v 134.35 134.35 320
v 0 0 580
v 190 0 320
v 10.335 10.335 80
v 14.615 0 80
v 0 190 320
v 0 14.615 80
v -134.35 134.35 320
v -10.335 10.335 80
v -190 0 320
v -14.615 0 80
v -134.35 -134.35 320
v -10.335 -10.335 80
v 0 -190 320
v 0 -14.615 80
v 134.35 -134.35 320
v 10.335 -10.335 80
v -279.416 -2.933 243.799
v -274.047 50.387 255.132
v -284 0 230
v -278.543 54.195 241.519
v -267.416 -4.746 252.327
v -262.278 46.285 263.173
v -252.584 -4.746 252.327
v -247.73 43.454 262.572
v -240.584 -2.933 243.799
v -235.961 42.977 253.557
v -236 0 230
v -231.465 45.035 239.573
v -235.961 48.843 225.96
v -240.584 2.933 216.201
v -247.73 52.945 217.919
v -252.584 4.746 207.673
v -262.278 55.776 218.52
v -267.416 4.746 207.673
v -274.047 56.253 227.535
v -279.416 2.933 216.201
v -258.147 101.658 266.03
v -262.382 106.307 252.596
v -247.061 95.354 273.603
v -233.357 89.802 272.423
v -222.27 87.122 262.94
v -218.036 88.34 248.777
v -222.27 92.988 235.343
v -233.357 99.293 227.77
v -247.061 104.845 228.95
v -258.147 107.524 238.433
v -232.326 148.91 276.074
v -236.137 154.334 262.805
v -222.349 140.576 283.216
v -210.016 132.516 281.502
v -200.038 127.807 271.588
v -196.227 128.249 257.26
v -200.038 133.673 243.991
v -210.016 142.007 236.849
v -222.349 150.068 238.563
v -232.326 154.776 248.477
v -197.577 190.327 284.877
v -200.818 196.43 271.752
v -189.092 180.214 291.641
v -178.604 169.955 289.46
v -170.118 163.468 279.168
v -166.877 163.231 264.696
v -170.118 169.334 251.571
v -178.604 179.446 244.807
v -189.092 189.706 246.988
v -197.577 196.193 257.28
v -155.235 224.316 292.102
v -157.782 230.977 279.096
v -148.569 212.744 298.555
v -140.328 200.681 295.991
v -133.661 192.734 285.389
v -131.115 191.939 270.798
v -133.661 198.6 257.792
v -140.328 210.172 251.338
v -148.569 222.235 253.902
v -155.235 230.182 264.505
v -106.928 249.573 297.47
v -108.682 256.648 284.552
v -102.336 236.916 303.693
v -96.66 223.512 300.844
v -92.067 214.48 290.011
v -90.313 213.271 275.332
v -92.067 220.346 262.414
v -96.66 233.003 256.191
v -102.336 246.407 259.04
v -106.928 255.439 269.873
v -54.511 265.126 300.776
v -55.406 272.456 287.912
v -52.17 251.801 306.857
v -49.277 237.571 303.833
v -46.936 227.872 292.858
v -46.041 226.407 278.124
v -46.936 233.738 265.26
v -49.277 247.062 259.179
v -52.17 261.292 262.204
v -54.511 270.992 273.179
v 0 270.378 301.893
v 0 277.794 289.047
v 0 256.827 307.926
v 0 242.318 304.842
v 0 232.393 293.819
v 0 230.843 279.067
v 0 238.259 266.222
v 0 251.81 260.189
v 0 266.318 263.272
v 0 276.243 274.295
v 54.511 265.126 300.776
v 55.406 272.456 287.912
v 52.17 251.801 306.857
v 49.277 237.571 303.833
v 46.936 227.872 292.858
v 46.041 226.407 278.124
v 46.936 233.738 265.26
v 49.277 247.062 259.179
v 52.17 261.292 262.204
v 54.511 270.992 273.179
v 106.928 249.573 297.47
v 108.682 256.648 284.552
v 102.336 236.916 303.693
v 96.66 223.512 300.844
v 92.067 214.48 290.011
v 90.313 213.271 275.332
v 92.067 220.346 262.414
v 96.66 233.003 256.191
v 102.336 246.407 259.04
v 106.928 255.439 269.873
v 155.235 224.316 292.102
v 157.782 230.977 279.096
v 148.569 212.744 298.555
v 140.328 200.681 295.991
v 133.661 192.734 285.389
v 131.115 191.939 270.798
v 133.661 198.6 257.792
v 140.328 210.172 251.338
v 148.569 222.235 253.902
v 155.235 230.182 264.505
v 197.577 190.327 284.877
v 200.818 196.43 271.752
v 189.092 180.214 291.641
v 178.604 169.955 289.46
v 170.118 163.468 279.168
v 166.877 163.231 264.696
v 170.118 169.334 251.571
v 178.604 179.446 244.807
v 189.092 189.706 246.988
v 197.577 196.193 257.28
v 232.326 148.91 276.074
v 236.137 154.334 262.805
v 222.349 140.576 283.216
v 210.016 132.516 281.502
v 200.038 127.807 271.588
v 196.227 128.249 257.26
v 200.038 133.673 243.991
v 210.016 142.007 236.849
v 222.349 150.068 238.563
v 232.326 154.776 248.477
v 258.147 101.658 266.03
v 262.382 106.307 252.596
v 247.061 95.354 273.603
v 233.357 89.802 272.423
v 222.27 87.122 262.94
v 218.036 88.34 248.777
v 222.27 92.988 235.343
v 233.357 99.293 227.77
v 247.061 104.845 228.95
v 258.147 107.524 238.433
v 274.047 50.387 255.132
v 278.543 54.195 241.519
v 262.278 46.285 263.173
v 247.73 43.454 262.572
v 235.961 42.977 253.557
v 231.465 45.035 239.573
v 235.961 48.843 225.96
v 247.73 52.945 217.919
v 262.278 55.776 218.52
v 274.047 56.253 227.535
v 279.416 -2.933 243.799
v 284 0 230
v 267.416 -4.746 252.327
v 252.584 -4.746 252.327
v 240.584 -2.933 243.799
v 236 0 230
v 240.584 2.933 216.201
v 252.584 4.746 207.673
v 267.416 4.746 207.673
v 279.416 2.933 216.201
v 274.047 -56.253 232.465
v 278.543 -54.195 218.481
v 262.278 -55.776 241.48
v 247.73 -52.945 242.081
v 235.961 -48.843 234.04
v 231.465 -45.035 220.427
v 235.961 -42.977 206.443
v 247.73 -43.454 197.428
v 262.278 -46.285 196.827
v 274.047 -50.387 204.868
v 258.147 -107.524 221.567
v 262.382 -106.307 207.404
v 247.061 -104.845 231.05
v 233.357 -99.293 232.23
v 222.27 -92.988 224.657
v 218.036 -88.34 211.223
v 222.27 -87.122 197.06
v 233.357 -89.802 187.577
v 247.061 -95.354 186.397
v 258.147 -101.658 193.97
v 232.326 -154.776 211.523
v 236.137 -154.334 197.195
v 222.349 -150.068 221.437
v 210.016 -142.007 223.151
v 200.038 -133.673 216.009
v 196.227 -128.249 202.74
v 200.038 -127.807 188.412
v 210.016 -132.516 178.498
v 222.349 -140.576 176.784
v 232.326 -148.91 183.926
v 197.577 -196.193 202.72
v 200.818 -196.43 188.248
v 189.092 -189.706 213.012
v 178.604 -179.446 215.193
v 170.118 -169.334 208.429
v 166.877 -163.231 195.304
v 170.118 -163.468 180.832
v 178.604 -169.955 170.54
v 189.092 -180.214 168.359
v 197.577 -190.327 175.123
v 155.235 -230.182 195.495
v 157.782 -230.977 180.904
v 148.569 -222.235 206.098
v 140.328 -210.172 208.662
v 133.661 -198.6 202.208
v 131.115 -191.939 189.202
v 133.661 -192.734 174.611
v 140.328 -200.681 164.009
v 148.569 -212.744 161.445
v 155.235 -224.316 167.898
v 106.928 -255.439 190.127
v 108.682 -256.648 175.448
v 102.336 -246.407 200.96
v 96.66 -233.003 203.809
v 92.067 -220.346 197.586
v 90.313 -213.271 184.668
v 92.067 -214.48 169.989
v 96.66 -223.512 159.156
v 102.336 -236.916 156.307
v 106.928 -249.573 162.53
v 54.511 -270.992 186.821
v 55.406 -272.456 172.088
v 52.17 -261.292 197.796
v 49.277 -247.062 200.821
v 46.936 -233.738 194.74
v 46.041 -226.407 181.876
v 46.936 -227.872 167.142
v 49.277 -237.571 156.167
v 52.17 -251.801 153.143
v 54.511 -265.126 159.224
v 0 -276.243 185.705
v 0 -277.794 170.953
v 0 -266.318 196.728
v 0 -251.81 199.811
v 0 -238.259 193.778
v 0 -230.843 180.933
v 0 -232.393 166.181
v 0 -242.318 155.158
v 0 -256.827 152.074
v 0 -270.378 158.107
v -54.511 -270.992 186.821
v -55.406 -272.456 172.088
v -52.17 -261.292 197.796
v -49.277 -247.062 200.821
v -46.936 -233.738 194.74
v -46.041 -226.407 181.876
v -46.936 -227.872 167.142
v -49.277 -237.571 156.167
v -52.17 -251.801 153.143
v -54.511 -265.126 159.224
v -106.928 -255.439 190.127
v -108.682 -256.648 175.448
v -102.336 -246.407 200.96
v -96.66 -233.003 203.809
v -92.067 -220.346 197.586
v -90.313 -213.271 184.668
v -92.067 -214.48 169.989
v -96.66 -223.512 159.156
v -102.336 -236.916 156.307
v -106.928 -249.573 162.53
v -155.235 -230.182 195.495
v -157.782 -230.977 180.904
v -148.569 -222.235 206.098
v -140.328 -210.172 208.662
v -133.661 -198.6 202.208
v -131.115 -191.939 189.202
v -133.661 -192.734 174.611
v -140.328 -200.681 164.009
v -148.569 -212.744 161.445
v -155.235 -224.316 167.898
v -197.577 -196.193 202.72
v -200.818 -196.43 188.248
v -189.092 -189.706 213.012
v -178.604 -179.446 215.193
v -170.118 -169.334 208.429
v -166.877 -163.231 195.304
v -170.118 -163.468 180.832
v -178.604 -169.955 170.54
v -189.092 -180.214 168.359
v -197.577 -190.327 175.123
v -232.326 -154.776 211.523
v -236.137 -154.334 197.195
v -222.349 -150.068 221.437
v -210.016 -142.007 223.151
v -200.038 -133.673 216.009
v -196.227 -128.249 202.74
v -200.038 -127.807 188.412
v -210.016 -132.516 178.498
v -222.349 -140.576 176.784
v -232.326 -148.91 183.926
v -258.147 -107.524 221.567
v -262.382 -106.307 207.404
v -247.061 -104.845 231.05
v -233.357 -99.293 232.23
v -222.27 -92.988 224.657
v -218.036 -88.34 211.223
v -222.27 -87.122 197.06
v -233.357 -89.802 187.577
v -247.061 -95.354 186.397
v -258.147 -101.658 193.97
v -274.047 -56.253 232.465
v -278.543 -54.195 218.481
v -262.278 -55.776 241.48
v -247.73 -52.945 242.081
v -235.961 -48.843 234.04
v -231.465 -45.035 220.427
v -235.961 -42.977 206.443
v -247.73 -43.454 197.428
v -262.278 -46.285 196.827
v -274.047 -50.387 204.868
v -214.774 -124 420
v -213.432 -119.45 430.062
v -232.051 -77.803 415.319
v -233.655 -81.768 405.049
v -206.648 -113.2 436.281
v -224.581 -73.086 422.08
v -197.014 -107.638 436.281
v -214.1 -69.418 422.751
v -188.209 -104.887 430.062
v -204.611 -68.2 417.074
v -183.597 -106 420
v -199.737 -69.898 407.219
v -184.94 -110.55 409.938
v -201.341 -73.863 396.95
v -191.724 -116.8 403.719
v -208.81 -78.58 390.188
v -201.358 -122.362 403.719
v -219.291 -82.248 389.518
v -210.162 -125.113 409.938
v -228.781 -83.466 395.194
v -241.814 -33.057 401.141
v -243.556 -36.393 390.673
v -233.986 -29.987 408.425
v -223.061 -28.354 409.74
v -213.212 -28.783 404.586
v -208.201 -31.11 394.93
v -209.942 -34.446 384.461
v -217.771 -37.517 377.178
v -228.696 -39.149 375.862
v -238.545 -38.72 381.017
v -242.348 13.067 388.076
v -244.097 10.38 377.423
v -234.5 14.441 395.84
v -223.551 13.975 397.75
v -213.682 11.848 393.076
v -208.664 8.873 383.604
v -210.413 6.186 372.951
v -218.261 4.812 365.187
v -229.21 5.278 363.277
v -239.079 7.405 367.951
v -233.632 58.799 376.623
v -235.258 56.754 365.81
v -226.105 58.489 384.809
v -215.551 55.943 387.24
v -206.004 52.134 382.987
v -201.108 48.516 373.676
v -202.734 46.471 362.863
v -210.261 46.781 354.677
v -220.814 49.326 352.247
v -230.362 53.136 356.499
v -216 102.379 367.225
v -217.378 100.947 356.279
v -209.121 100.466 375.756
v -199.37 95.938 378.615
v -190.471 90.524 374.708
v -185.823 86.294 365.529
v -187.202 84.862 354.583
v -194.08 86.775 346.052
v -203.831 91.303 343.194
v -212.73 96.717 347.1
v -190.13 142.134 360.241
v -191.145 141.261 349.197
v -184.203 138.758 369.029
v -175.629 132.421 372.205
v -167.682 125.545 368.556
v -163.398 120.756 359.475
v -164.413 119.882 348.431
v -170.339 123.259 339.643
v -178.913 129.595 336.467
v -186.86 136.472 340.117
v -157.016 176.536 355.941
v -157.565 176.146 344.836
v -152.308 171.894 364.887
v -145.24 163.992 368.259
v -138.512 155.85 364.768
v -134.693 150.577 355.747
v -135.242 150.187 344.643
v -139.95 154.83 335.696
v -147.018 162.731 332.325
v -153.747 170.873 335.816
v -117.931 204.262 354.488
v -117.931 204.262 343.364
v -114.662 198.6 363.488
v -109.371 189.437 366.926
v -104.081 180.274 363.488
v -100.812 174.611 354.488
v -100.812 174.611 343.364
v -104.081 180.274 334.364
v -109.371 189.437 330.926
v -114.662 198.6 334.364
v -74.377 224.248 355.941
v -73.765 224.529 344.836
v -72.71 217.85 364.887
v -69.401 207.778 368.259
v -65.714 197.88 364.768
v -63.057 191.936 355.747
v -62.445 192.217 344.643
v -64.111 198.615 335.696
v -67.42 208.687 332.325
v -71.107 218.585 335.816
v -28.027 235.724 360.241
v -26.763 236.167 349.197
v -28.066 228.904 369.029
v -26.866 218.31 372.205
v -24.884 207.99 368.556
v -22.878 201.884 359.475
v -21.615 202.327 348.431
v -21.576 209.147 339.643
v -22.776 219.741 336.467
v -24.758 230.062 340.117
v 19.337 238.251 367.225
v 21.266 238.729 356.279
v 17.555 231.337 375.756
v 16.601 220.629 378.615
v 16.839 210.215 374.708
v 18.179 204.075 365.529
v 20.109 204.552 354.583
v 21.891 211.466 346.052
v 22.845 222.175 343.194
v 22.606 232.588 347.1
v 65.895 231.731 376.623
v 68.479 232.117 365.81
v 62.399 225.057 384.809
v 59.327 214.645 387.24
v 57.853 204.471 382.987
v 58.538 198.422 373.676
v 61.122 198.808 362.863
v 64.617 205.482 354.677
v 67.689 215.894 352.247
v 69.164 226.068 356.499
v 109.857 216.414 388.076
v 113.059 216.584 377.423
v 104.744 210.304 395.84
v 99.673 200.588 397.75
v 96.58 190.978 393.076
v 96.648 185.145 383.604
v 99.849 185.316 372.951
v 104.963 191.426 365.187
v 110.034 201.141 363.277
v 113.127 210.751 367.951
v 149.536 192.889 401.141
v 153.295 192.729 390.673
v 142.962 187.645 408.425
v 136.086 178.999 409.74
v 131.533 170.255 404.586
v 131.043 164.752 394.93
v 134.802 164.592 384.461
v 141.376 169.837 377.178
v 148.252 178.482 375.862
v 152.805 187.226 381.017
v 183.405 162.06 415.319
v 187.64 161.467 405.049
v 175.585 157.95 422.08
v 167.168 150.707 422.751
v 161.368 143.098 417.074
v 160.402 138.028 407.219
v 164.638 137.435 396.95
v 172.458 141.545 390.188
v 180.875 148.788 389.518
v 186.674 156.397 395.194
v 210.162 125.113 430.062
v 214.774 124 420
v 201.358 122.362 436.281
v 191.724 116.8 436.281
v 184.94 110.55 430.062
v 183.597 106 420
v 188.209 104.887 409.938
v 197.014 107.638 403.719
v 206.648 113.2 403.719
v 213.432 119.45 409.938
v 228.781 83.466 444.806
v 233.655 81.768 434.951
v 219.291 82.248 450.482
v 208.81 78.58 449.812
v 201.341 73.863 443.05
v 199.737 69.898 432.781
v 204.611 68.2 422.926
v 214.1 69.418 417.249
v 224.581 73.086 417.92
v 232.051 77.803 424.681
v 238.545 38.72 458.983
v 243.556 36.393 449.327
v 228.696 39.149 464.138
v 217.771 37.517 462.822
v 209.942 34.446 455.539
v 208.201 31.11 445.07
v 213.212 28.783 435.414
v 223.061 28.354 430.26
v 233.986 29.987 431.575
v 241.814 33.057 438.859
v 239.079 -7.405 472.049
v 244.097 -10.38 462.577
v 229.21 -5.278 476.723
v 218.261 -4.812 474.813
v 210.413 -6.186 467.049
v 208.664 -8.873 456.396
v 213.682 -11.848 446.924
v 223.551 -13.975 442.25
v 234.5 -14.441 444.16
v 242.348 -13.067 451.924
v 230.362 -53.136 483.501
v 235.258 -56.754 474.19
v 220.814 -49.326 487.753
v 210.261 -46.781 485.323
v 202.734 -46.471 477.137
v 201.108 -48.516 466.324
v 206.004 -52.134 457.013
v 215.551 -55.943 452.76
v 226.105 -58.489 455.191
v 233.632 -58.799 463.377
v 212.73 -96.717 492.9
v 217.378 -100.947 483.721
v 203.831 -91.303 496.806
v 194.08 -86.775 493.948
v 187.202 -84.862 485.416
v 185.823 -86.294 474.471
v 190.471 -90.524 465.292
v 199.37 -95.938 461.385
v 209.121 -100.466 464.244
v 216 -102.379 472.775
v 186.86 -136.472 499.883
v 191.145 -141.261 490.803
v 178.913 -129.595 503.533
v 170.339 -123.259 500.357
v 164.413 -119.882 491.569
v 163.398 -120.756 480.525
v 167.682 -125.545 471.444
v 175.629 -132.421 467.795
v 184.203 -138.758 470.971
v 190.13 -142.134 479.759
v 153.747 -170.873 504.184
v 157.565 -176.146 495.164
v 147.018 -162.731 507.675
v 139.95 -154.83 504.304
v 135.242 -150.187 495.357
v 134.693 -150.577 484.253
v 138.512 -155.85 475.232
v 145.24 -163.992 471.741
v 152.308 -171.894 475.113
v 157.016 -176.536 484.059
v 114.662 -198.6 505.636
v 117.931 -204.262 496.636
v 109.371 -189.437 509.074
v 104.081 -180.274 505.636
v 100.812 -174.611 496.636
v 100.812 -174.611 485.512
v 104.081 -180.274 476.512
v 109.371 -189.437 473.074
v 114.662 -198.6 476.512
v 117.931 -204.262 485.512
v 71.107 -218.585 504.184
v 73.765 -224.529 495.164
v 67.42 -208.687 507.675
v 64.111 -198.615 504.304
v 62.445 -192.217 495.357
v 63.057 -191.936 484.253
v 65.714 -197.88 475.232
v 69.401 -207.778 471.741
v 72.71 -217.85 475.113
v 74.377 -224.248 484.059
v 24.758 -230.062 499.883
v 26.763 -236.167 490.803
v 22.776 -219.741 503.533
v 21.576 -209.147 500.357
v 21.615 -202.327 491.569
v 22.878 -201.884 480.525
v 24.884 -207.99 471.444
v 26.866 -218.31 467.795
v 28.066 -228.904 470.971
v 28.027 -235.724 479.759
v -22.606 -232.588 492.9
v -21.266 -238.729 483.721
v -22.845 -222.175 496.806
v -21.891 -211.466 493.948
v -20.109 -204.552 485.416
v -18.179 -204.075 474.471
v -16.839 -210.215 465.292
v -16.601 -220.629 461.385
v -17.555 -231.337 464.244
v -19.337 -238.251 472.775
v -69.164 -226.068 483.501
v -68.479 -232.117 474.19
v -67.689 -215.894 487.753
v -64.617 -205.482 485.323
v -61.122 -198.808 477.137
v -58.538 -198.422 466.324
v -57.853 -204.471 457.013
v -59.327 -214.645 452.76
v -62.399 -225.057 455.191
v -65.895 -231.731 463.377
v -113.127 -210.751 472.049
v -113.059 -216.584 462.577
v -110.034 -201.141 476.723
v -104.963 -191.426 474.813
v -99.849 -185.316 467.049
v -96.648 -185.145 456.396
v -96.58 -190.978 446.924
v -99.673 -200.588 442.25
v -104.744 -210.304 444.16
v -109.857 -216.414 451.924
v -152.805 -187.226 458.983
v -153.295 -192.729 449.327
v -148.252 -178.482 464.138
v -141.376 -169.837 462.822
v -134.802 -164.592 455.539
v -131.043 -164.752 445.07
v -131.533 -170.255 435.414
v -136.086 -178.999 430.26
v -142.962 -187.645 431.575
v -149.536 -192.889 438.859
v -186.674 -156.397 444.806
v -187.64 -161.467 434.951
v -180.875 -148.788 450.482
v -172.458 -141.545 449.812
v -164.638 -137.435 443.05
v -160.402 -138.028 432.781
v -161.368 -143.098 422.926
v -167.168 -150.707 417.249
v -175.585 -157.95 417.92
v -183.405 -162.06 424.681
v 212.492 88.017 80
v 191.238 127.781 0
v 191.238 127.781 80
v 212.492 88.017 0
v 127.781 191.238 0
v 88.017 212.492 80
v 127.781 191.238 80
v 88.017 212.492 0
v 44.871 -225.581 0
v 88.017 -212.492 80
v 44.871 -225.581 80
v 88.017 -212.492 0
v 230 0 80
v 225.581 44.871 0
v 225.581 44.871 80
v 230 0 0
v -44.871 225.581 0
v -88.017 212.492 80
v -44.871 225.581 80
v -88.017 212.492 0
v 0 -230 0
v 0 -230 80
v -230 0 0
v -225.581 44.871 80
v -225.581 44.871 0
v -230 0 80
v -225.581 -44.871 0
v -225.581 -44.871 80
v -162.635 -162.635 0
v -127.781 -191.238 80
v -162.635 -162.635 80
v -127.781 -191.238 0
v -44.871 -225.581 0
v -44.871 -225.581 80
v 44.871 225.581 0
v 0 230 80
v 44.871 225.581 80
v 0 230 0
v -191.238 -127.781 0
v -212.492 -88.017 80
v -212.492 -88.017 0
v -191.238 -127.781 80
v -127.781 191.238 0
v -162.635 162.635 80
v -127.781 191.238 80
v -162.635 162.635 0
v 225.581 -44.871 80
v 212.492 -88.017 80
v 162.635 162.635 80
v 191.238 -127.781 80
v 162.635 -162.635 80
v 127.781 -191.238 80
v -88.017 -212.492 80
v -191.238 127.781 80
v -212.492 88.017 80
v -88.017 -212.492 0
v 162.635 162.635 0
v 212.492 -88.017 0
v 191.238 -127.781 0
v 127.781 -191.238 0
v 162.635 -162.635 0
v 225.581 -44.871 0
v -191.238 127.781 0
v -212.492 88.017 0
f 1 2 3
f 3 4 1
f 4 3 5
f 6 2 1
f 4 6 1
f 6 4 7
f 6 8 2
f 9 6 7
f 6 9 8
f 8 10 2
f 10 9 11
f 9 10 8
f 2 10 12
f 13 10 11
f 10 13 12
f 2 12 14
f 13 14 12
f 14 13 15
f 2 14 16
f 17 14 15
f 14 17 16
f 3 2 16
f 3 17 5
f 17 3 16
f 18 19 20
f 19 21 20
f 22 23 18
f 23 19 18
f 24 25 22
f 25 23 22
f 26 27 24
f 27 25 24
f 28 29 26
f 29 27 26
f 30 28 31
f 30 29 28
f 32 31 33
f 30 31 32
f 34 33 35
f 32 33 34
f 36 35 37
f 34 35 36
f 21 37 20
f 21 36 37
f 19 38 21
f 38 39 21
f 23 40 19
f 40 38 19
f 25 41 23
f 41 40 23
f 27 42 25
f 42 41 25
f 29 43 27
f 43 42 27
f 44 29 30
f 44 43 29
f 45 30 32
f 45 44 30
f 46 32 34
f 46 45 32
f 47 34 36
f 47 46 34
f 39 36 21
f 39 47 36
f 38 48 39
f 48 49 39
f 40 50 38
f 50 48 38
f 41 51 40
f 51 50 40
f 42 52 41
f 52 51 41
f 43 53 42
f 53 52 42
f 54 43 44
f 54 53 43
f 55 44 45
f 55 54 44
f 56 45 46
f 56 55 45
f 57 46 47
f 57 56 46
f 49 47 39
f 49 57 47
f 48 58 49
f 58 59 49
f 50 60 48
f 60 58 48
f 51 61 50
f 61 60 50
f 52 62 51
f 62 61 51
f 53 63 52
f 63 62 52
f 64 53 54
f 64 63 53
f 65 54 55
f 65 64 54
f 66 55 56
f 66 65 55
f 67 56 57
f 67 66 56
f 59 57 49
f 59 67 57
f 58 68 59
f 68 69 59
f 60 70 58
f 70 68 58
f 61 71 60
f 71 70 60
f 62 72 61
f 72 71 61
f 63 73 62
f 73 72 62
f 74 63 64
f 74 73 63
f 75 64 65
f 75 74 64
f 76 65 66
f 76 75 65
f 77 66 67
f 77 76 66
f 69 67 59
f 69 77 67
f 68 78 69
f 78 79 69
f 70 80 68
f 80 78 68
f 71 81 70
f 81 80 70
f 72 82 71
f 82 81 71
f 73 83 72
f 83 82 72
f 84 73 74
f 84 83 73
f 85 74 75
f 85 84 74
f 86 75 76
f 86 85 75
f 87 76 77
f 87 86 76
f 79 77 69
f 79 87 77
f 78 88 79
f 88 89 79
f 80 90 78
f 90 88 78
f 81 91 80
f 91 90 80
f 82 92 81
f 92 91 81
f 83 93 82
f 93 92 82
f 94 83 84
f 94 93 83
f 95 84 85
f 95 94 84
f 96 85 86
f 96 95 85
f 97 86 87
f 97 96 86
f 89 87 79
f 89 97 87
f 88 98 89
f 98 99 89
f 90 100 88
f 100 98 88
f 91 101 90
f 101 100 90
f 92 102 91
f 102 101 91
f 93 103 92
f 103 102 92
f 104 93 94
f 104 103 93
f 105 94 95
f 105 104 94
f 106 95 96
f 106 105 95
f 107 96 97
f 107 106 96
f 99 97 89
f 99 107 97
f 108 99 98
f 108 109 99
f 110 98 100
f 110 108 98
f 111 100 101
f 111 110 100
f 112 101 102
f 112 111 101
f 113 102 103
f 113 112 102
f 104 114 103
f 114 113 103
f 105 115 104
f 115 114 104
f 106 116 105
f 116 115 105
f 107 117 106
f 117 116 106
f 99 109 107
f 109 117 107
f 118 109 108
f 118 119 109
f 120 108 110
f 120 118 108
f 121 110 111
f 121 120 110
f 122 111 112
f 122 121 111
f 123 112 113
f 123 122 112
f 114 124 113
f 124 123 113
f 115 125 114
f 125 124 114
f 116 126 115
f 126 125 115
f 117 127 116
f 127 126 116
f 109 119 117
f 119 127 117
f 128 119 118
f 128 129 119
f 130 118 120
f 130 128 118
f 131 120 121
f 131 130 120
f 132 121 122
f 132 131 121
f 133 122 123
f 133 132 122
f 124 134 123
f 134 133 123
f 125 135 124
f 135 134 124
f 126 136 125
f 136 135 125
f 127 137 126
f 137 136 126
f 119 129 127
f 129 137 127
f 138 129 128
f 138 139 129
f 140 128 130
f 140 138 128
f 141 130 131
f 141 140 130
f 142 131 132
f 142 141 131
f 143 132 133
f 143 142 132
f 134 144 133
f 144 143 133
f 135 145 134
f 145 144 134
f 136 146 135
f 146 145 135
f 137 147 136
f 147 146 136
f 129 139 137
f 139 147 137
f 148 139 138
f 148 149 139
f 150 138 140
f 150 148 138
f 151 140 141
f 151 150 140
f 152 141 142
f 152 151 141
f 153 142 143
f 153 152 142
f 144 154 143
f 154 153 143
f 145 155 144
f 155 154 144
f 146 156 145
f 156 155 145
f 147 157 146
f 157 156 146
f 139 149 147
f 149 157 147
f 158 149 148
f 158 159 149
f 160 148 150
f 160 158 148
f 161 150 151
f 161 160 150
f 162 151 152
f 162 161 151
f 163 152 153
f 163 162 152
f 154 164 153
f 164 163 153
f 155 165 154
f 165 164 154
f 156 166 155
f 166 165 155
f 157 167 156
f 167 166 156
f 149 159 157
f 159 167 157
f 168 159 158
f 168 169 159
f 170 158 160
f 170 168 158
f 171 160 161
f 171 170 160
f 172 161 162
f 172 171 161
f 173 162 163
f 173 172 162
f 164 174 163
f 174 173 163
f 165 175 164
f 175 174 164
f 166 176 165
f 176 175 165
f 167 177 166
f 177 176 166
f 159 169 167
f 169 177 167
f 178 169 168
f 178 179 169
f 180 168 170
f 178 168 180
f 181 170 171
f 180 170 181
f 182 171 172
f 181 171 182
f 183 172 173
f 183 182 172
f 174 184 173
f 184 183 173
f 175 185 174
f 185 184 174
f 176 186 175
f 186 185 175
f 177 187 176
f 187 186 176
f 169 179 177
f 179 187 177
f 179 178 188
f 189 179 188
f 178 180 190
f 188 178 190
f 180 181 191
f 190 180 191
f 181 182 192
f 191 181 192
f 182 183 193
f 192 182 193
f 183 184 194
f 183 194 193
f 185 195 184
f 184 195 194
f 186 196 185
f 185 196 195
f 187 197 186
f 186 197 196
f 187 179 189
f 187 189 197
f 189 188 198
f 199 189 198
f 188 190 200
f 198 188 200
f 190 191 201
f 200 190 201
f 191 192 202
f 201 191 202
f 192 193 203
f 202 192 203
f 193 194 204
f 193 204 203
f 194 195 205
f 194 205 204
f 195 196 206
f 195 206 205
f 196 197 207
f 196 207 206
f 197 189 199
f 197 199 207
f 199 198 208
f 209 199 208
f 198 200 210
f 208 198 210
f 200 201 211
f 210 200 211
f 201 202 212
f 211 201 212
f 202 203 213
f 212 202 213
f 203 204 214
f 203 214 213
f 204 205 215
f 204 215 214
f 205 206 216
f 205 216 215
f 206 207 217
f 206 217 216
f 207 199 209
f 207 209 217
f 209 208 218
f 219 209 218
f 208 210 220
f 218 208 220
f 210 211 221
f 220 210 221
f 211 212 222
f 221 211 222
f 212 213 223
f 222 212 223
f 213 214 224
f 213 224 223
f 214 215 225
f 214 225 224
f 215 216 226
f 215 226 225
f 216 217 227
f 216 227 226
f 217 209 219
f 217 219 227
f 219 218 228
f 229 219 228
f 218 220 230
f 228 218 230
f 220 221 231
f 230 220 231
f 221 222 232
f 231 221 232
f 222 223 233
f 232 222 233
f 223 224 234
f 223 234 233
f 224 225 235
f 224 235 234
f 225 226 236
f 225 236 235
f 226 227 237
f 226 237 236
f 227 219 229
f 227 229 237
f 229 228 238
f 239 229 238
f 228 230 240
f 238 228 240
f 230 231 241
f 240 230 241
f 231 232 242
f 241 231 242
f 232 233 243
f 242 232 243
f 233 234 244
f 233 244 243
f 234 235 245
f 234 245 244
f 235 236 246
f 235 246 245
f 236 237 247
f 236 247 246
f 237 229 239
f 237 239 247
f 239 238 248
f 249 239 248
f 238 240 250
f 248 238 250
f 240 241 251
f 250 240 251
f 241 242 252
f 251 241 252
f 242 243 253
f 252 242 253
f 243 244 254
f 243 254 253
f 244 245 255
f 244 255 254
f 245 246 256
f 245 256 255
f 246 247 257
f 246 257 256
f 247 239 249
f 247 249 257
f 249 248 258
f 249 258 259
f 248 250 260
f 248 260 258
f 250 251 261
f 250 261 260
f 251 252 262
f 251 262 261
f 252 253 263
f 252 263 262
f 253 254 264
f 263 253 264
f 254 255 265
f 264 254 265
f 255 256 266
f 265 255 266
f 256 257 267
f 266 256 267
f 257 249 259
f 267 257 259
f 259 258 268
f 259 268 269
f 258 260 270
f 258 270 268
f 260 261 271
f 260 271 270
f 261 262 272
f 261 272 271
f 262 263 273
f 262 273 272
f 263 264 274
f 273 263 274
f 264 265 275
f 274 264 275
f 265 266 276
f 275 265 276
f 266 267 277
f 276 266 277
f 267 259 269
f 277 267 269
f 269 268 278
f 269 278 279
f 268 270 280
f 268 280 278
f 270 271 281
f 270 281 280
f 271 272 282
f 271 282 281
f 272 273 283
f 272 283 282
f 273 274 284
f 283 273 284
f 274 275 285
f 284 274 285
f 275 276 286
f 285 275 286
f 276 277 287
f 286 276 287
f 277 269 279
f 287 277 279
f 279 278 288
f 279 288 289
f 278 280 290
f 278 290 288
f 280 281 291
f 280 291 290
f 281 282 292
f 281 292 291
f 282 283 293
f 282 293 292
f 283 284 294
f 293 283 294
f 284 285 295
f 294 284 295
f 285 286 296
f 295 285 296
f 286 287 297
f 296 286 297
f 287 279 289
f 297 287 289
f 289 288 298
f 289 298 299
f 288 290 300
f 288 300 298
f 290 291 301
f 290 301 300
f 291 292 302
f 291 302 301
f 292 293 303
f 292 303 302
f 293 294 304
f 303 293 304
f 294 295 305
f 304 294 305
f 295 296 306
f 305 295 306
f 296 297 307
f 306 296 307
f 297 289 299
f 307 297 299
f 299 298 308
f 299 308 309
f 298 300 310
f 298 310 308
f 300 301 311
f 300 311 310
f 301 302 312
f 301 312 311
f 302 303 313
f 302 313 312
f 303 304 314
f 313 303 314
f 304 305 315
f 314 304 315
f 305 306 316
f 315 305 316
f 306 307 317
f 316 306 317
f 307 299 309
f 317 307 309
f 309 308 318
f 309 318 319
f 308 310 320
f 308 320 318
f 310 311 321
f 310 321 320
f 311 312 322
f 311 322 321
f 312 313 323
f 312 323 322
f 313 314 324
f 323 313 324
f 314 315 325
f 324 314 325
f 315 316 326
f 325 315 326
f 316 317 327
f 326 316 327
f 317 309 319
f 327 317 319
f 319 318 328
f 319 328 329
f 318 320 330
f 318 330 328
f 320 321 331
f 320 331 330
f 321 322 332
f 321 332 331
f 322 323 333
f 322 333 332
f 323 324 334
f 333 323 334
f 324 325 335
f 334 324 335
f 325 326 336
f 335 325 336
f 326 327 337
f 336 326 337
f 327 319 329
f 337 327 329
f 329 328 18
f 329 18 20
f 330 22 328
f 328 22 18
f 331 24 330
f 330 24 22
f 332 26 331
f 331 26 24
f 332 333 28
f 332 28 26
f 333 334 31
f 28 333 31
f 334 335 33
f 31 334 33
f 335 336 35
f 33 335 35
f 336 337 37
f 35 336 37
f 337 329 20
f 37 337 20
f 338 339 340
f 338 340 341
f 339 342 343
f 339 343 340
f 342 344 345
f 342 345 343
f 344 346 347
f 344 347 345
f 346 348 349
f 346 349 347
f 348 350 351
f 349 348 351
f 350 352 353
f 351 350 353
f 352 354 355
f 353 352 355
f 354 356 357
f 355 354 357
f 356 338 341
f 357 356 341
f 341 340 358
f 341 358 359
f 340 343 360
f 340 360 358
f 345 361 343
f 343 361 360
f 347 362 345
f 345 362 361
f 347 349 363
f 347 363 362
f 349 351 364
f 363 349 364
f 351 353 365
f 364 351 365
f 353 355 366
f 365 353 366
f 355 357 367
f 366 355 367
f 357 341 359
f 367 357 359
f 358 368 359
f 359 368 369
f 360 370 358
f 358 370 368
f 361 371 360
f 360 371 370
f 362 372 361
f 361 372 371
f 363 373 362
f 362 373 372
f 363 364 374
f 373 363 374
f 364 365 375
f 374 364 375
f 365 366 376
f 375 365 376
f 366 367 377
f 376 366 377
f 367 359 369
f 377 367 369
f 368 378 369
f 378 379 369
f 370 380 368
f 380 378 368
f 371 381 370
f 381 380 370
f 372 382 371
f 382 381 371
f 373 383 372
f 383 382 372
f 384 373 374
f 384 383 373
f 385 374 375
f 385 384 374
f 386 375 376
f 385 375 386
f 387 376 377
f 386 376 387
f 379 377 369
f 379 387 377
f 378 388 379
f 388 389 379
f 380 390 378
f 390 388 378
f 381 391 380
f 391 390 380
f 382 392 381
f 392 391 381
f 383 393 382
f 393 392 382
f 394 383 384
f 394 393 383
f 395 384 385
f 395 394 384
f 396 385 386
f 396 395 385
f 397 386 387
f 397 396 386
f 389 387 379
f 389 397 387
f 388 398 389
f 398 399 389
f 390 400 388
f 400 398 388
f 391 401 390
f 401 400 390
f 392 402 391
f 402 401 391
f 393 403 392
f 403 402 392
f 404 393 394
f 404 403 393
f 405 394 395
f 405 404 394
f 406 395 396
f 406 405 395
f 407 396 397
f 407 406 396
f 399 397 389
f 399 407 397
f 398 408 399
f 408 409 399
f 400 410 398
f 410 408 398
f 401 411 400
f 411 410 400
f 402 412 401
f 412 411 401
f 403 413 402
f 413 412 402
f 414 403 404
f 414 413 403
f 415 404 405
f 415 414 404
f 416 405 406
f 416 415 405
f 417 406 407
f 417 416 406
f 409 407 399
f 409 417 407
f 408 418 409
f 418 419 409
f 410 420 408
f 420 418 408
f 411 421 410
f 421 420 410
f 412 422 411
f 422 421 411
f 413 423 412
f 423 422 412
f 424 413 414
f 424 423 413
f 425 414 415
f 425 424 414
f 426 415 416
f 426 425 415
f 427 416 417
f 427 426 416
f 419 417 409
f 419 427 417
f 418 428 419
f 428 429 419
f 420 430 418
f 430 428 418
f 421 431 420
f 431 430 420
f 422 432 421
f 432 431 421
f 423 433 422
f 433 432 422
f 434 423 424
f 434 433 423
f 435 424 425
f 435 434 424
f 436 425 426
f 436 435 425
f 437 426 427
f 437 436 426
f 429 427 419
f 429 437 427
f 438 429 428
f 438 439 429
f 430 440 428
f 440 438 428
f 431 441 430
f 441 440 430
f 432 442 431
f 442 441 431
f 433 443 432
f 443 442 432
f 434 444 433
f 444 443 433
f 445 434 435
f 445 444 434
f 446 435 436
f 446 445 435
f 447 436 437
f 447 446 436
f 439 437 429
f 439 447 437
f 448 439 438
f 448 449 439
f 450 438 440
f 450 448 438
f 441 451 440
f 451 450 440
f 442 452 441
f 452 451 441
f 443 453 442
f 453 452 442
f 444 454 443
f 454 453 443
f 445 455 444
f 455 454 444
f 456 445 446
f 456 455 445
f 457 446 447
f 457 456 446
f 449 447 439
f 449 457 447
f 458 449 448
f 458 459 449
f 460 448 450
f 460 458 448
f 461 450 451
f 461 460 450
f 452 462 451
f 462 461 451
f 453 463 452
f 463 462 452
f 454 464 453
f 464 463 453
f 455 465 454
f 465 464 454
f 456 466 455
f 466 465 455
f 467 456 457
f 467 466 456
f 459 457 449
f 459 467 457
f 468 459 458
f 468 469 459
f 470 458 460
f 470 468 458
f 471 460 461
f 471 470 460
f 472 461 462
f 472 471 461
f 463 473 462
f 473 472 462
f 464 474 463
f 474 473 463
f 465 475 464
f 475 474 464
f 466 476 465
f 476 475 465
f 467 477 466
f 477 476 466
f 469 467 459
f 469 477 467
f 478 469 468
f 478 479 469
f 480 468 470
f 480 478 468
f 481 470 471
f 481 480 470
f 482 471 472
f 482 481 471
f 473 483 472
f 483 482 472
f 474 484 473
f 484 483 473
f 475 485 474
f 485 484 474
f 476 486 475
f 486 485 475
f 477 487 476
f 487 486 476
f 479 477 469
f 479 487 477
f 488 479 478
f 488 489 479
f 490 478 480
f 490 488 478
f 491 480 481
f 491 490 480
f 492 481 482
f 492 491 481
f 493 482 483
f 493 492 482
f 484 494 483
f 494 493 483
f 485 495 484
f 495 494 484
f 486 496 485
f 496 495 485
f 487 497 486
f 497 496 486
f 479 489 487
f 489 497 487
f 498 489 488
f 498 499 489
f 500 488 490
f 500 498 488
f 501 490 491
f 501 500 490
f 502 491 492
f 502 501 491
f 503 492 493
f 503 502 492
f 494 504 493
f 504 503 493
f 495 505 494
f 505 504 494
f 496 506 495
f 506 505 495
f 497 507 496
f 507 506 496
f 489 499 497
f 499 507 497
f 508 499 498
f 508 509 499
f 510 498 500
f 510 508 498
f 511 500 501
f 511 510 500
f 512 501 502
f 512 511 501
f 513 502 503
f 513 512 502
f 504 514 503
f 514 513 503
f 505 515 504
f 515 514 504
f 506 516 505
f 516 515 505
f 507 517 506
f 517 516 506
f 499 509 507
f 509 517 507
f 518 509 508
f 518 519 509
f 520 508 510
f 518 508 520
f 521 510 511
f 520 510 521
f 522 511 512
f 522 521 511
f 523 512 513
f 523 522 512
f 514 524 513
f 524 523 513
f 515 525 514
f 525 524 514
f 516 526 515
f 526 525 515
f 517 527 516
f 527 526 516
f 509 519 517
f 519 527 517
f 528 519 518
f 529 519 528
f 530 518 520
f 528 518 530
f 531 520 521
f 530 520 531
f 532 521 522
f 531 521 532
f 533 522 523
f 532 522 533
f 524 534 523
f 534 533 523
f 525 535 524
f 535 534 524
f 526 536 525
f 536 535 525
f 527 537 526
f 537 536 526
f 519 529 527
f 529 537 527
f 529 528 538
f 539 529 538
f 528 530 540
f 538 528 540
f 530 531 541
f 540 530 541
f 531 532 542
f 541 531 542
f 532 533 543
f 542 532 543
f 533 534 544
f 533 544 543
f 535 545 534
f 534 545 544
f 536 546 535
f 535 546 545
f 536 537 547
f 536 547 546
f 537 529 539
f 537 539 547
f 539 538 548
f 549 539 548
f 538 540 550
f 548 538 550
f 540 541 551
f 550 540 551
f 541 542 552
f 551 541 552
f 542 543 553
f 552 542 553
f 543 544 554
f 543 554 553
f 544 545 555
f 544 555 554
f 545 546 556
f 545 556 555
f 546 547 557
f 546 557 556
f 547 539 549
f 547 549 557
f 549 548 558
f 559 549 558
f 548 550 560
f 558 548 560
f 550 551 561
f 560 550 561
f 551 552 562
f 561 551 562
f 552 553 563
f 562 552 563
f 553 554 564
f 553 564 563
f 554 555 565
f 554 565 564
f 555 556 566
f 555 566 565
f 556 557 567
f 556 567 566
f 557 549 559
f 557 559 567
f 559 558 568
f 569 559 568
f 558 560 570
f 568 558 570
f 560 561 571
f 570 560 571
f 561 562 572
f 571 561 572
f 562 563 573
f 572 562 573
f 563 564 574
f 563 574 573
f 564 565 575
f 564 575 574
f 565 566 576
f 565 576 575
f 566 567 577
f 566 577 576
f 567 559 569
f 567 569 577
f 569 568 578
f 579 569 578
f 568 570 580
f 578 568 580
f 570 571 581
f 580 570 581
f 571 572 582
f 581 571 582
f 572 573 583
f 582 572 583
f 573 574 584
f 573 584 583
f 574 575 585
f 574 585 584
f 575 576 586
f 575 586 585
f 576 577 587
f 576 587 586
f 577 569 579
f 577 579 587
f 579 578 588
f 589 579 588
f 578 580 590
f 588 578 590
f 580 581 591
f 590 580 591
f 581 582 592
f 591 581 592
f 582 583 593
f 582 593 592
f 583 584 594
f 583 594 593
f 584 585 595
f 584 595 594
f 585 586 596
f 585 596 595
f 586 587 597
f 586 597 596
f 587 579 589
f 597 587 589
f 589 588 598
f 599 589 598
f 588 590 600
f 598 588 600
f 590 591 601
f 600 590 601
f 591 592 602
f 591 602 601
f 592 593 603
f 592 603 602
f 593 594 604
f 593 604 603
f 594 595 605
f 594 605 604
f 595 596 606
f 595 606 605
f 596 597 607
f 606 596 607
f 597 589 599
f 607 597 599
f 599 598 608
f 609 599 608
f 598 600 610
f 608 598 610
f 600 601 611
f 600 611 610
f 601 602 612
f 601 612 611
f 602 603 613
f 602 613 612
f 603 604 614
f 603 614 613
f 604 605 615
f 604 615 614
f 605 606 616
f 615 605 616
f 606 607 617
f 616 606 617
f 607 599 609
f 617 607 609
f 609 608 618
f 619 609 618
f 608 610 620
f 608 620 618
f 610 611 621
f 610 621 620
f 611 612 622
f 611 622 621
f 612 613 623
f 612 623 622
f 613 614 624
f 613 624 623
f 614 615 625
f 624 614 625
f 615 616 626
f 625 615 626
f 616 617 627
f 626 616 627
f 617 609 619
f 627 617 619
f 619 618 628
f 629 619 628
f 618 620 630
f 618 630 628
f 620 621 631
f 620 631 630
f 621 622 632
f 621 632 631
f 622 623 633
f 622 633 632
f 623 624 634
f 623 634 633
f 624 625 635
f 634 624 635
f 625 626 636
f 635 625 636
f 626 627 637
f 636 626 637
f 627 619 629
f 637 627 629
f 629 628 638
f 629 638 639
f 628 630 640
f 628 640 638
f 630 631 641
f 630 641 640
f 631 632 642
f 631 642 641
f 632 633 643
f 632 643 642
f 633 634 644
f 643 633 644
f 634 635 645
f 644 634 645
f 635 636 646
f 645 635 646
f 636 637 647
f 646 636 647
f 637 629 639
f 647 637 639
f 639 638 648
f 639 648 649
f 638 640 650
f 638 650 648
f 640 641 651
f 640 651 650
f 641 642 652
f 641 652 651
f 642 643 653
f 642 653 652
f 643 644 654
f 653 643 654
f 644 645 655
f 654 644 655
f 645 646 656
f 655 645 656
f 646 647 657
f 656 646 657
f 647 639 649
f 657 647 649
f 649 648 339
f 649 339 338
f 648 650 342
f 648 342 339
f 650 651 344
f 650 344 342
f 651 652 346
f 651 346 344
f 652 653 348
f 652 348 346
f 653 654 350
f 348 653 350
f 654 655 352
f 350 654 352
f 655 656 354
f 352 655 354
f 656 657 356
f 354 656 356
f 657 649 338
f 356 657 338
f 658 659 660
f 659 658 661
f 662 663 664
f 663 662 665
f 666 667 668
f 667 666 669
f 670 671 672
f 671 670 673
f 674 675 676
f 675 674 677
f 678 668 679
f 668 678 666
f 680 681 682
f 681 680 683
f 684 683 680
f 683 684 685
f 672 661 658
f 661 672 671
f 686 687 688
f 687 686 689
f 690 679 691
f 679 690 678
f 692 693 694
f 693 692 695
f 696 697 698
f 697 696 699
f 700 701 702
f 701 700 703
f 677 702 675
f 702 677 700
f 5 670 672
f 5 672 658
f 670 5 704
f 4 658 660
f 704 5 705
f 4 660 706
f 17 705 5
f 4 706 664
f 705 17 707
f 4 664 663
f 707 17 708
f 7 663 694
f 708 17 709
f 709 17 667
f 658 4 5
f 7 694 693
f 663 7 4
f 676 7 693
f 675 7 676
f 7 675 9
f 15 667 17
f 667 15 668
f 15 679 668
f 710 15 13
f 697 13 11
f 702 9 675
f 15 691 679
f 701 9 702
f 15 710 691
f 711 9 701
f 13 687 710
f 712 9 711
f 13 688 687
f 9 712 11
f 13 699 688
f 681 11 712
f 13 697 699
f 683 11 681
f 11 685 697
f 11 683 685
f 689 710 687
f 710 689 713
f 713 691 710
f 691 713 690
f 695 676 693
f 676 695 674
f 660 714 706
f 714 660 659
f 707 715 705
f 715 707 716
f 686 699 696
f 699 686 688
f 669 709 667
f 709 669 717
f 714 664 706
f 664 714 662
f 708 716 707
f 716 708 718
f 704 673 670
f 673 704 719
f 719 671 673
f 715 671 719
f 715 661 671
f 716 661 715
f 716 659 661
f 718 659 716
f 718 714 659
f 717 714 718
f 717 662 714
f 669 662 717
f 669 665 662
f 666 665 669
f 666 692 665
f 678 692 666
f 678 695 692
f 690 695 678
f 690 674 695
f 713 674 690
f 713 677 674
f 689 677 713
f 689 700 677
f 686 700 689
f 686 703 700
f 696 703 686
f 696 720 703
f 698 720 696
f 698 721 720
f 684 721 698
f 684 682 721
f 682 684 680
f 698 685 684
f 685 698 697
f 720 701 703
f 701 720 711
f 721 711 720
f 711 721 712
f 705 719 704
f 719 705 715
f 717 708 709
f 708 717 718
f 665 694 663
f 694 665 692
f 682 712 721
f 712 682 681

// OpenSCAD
// Generated by AXM Machine Geometry Foundry 0.4.0
// Asset: AXM-PICKUP-GEM-001 AXM Energy Pickup Gem v0.4.0
// Units: millimetres; source orientation: +Z up, -Y forward.
// Canonical source is recipe.json. This is an editable generated bridge.

// instance: gem | base: gem | print_group: gem
color([0.66275, 0.32157, 1.00000, 0.92157])
translate([0, 0, 320]) rotate([0, 0, 0]) scale([1, 1, 1]) polyhedron(points=[[190.0, 0.0, 0.0], [134.35028843, 134.35028843, 0.0], [0.0, 190.0, 0.0], [-134.35028843, 134.35028843, 0.0], [-190.0, 0.0, 0.0], [-134.35028843, -134.35028843, 0.0], [-0.0, -190.0, 0.0], [134.35028843, -134.35028843, 0.0], [0.0, 0.0, 260.0], [0.0, 0.0, -260.0]], faces=[[8, 0, 1], [9, 1, 0], [8, 1, 2], [9, 2, 1], [8, 2, 3], [9, 3, 2], [8, 3, 4], [9, 4, 3], [8, 4, 5], [9, 5, 4], [8, 5, 6], [9, 6, 5], [8, 6, 7], [9, 7, 6], [8, 7, 0], [9, 0, 7]], convexity=10);

// instance: lower_orbit | base: lower_orbit | print_group: lower_orbit
color([0.13725, 0.80392, 0.92157, 1.00000])
translate([0, 0, 230]) rotate([12, 0, 0]) scale([1, 1, 1]) rotate_extrude($fn=32) translate([260, 0, 0]) circle(r=24, $fn=10);

// instance: upper_orbit | base: upper_orbit | print_group: upper_orbit
color([1.00000, 0.67451, 0.14510, 1.00000])
translate([0, 0, 420]) rotate([-18, 0, 30]) scale([1, 1, 1]) rotate_extrude($fn=32) translate([230, 0, 0]) circle(r=18, $fn=10);

// instance: base | base: base | print_group: base
color([0.09412, 0.11373, 0.15294, 1.00000])
translate([0, 0, 40]) rotate([0, 0, 0]) scale([1, 1, 1]) cylinder(h=80, r=230, center=true, $fn=32);
